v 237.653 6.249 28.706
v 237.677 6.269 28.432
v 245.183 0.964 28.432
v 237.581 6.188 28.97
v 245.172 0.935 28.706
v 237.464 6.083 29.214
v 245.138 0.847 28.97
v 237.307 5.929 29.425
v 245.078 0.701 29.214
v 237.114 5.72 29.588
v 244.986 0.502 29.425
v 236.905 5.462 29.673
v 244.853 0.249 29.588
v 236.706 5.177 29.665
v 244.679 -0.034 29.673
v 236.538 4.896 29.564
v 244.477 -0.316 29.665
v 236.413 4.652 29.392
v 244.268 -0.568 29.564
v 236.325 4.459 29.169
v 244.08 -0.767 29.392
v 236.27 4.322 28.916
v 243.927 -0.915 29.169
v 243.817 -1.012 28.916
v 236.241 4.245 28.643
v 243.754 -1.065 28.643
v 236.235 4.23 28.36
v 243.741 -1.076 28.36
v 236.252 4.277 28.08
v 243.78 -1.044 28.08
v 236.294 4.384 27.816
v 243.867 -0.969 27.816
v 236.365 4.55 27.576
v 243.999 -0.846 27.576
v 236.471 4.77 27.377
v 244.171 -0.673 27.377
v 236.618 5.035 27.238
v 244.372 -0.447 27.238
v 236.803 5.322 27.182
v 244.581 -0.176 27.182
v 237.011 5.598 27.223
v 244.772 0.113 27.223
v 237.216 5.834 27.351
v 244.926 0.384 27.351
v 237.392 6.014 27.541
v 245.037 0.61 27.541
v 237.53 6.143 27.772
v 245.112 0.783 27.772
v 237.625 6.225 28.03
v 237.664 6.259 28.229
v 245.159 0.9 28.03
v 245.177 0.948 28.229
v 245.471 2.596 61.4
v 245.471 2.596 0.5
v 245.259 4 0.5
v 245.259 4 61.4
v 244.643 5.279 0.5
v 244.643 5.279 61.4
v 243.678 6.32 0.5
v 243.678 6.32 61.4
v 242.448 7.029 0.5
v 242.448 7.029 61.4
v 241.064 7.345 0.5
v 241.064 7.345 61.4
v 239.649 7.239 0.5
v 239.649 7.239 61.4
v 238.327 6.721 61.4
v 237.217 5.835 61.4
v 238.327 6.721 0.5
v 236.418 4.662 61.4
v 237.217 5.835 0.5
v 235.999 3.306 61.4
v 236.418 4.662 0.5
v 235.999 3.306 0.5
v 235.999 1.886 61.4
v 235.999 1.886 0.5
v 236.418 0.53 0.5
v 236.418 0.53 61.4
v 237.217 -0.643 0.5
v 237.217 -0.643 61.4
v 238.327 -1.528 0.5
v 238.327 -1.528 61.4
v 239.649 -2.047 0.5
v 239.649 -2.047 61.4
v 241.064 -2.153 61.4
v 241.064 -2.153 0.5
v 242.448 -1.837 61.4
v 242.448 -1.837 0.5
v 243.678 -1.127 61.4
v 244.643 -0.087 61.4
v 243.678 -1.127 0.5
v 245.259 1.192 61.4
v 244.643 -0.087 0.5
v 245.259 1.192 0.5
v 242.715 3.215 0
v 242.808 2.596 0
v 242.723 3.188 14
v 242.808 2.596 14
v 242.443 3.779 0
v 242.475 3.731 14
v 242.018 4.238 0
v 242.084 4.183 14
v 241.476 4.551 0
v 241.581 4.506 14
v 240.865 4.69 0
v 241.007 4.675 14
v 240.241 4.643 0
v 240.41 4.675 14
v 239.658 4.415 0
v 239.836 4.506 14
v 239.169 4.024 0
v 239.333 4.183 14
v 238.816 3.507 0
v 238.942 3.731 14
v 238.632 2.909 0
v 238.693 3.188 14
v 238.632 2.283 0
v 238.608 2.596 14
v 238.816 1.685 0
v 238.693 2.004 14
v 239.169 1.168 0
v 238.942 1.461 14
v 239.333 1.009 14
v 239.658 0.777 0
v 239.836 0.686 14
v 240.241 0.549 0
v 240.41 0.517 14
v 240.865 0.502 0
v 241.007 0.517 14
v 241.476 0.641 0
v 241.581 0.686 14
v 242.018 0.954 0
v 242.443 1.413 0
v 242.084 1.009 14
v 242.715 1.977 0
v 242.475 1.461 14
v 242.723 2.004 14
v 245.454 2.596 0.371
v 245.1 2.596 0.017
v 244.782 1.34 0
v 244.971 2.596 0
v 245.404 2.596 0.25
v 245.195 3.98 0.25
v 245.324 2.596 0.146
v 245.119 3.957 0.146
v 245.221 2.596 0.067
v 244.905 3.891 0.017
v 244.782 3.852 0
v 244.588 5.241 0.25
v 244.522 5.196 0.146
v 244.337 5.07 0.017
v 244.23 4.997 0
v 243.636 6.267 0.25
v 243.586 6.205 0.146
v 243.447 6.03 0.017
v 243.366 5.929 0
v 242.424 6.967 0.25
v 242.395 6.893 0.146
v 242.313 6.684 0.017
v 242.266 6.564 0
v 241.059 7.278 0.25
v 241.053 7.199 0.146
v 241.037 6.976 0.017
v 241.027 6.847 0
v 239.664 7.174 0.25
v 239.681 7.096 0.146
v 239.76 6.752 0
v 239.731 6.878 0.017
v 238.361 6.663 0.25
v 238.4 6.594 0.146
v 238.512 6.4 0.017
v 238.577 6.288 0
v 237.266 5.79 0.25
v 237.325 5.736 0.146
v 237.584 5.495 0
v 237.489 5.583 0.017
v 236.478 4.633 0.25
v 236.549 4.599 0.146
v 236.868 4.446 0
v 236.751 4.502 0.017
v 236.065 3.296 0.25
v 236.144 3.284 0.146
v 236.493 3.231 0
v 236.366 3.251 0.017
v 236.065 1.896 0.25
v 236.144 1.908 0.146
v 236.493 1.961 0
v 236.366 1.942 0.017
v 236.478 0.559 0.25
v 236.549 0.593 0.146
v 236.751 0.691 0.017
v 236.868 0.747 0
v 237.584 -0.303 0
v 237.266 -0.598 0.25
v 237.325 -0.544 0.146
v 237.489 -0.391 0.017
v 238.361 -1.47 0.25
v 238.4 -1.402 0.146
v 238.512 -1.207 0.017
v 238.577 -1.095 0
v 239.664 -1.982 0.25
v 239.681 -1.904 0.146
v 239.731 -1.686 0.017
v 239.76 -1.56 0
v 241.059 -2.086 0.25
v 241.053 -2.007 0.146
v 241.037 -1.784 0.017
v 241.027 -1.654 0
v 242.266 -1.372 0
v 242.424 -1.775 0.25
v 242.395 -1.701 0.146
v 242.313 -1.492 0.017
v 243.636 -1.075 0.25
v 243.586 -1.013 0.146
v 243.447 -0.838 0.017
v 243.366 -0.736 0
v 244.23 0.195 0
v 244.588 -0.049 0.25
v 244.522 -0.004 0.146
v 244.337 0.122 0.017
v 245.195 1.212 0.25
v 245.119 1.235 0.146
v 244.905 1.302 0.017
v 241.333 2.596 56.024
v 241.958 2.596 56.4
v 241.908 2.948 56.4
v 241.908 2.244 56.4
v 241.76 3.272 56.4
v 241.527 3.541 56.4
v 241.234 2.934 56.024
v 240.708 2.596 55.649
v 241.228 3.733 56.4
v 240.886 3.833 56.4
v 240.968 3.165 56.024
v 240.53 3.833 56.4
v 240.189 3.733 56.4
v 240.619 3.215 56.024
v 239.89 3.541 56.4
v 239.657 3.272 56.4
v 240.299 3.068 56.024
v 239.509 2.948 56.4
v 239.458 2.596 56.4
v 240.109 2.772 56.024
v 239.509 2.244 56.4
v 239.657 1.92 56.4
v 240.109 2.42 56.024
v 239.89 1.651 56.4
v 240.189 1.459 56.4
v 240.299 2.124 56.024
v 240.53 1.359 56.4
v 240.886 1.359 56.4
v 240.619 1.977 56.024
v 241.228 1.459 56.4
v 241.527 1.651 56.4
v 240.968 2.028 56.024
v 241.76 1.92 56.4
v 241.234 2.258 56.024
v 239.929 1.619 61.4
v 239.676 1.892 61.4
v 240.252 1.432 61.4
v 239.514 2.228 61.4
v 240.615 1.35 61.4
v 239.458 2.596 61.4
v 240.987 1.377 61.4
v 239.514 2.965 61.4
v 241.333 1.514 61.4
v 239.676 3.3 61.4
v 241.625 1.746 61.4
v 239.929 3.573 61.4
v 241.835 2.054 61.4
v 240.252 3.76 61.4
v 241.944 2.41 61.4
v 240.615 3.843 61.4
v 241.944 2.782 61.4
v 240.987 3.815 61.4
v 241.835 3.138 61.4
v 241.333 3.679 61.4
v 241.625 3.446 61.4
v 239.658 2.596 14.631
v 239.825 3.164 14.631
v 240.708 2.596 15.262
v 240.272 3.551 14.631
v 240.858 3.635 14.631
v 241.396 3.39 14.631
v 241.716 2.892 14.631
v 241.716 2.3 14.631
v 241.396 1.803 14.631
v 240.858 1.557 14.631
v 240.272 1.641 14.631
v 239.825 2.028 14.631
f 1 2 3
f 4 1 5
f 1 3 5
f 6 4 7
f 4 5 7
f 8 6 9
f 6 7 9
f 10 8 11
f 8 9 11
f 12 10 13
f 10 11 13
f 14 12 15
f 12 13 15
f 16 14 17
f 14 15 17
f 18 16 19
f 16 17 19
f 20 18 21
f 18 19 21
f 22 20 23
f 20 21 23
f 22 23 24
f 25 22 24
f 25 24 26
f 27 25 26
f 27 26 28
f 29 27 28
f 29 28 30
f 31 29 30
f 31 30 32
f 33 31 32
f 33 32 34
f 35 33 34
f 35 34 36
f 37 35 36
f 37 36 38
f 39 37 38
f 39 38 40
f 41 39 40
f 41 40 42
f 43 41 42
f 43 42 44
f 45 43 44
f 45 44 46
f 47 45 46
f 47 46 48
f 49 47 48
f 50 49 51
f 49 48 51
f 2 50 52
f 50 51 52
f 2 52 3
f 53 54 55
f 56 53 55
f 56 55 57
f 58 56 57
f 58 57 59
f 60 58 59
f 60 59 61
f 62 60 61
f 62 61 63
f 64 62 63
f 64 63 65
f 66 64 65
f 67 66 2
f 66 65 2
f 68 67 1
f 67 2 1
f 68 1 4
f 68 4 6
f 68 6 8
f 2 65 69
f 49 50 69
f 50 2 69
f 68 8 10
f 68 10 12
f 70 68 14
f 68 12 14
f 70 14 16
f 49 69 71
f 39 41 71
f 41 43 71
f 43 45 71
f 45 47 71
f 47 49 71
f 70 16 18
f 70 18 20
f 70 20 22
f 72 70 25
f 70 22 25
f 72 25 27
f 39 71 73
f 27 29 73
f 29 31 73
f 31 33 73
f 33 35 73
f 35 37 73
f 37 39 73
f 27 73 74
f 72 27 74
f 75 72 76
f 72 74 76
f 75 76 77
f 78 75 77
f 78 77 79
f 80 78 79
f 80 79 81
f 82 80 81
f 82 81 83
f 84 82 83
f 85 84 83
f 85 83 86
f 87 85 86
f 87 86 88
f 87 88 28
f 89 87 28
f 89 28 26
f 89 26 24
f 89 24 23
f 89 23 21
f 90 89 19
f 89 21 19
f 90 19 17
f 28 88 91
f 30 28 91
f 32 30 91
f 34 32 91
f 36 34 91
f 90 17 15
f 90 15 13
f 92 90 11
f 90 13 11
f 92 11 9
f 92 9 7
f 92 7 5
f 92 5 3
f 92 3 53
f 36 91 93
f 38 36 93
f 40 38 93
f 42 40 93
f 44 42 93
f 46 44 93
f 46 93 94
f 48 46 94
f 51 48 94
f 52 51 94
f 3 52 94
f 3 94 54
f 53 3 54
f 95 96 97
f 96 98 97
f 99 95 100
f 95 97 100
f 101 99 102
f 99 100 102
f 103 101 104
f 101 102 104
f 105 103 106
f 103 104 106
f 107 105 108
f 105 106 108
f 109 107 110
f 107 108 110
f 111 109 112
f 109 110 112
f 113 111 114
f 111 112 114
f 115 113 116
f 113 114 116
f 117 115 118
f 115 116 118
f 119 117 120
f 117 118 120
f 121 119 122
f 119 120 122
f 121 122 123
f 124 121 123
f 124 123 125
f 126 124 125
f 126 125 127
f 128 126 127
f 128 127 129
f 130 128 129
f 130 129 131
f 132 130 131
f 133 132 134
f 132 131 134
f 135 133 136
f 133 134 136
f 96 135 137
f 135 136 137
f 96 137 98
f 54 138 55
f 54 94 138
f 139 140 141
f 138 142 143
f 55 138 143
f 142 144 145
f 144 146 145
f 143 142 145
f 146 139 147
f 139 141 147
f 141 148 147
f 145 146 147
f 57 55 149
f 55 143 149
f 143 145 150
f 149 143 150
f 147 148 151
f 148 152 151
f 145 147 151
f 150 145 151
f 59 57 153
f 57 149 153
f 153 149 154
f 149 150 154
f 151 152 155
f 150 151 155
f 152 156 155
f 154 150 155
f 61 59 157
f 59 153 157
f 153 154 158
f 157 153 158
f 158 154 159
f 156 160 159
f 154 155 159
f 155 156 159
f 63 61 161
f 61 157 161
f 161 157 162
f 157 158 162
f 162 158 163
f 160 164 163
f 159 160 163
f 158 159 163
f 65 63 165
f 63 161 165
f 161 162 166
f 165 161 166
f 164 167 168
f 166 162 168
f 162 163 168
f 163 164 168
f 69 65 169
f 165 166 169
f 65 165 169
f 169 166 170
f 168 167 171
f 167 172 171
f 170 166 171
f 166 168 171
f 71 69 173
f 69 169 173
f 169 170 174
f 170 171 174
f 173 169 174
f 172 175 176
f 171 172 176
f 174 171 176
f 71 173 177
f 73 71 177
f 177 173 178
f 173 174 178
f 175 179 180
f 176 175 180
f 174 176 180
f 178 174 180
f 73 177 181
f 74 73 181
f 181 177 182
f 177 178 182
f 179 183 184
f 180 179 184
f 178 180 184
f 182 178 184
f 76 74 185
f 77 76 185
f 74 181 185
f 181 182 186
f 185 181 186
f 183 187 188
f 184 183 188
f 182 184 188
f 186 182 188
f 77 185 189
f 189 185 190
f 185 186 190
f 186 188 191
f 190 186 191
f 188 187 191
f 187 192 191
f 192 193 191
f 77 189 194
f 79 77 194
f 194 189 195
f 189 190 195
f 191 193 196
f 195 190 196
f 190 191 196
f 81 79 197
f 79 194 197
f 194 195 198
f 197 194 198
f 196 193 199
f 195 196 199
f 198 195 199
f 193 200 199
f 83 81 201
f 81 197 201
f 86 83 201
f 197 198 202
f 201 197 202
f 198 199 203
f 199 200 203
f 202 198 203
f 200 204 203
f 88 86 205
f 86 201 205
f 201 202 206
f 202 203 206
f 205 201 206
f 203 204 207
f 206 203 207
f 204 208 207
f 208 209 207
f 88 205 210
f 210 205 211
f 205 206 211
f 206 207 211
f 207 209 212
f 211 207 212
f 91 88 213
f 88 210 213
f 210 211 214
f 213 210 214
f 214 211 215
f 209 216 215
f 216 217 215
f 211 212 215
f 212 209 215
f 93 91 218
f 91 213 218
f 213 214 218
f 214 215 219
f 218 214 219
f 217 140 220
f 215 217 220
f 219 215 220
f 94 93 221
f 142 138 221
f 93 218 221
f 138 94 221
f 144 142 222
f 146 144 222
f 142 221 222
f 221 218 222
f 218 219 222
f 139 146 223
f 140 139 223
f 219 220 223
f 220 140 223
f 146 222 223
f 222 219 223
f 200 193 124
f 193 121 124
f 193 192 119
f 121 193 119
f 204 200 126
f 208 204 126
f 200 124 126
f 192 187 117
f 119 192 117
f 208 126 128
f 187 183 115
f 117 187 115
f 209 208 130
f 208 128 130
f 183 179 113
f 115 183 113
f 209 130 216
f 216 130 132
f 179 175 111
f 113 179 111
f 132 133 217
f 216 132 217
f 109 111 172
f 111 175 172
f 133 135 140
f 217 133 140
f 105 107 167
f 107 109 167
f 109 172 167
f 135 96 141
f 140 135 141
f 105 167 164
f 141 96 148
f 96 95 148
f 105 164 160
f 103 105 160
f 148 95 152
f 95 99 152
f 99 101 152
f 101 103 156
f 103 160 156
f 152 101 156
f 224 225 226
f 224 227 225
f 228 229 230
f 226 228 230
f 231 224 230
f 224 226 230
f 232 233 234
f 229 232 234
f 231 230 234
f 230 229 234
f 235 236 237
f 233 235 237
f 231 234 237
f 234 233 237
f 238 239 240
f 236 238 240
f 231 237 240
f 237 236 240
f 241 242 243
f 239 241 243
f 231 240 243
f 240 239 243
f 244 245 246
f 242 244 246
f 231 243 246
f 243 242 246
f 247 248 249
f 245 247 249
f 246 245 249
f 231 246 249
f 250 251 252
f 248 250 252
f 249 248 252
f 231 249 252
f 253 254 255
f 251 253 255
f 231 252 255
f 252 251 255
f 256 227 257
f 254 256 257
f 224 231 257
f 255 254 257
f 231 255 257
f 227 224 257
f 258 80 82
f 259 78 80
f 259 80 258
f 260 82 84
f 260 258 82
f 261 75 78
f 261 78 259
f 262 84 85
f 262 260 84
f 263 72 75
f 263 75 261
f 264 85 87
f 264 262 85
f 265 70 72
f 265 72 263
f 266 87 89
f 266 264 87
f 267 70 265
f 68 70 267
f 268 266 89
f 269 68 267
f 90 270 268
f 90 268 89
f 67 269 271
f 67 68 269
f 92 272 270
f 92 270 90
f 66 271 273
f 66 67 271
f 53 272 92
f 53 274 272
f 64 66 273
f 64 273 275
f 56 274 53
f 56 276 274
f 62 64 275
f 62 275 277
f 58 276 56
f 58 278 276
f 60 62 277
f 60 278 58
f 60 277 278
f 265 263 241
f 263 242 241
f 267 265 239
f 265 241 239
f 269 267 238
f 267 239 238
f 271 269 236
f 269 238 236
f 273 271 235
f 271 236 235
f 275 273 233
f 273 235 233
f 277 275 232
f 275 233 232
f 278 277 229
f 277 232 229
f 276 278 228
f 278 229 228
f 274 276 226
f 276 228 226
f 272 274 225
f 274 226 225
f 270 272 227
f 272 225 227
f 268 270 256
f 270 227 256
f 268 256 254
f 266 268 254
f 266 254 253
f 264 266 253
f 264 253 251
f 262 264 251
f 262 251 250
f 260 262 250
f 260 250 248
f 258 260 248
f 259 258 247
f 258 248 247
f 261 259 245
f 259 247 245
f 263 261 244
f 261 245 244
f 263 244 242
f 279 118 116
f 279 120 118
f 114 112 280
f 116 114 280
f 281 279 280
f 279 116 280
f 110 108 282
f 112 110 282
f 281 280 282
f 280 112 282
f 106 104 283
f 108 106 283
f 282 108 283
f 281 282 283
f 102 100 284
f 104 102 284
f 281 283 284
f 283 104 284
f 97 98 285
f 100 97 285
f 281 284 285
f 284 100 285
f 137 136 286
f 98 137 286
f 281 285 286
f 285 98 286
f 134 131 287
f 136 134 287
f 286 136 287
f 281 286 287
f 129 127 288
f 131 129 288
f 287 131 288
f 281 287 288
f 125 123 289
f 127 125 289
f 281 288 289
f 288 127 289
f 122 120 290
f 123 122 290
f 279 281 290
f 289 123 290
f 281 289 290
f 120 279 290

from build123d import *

# Parameters (mm, degrees)
ESBO_O1_R                                      = 4.7625
RESSALTO_EXTRUS_O1_DEPTH                       = 61.4
FURO_ROSCADO_DE_M5X0_81_D                      = 4.2
FURO_ROSCADO_DE_M5X0_81_DEPTH                  = 14
FURO_ROSCADO_DE_M5X0_81_TIP                    = 1.2618073
FILETE1_R                                      = 0.5
BROCA_DE_ROSQUEAR_PARA_TARRAXA_DE_M3X0_5_D     = 2.5
BROCA_DE_ROSQUEAR_PARA_TARRAXA_DE_M3X0_5_DEPTH = 5
BROCA_DE_ROSQUEAR_PARA_TARRAXA_DE_M3X0_5_TIP   = 0.751075774
BROCA_DE_ROSQUEAR_PARA_TARRAXA_DE_M3_2_D       = 2.5
BROCA_DE_ROSQUEAR_PARA_TARRAXA_DE_M3_2_DEPTH   = 10
BROCA_DE_ROSQUEAR_PARA_TARRAXA_DE_M3_2_TIP     = 0.751075774


with BuildPart() as part:
    # Esboço1 → Ressalto-extrusão1 (new body)
    with BuildSketch(Plane.XY):
        with Locations((240.708388302, 2.596082859)):
            Circle(ESBO_O1_R)
    extrude(amount=RESSALTO_EXTRUS_O1_DEPTH)

    # Furo roscado de M5x0.81
    with Locations(Plane(origin=(0, 0, 0), x_dir=(-1, 0, 0), z_dir=(0, 0, -1))):
        with Locations((-240.708388302, 2.596082859)):
            Hole(FURO_ROSCADO_DE_M5X0_81_D / 2, depth=FURO_ROSCADO_DE_M5X0_81_DEPTH)
            with Locations((0, 0, -(FURO_ROSCADO_DE_M5X0_81_DEPTH + FURO_ROSCADO_DE_M5X0_81_TIP / 2))):  # 118° drill point
                Cone(0, FURO_ROSCADO_DE_M5X0_81_D / 2, FURO_ROSCADO_DE_M5X0_81_TIP, mode=Mode.SUBTRACT)

    # Filete1
    filete1_edges = [part.edges().sort_by_distance(p)[0] for p in [
        (235.945888302, 2.596082859, 0),
    ]]
    fillet(filete1_edges, radius=FILETE1_R)

    # Broca de rosquear para tarraxa de M3x0.5
    with Locations(Plane.XY.offset(61.4)):
        with Locations((240.708388302, 2.596082859)):
            Hole(BROCA_DE_ROSQUEAR_PARA_TARRAXA_DE_M3X0_5_D / 2, depth=BROCA_DE_ROSQUEAR_PARA_TARRAXA_DE_M3X0_5_DEPTH)
            with Locations((0, 0, -(BROCA_DE_ROSQUEAR_PARA_TARRAXA_DE_M3X0_5_DEPTH + BROCA_DE_ROSQUEAR_PARA_TARRAXA_DE_M3X0_5_TIP / 2))):  # 118° drill point
                Cone(0, BROCA_DE_ROSQUEAR_PARA_TARRAXA_DE_M3X0_5_D / 2, BROCA_DE_ROSQUEAR_PARA_TARRAXA_DE_M3X0_5_TIP, mode=Mode.SUBTRACT)

    # Broca de rosquear para tarraxa de M3 2
    with Locations(Plane(origin=(236.819403783, 5.345120084, 28.431873204), x_dir=(-0.577225664074, -0.81658467579, 0), z_dir=(-0.81658467579, 0.577225664074, 0))):
        with Locations((0, 0)):
            Hole(BROCA_DE_ROSQUEAR_PARA_TARRAXA_DE_M3_2_D / 2, depth=BROCA_DE_ROSQUEAR_PARA_TARRAXA_DE_M3_2_DEPTH)
            with Locations((0, 0, -(BROCA_DE_ROSQUEAR_PARA_TARRAXA_DE_M3_2_DEPTH + BROCA_DE_ROSQUEAR_PARA_TARRAXA_DE_M3_2_TIP / 2))):  # 118° drill point
                Cone(0, BROCA_DE_ROSQUEAR_PARA_TARRAXA_DE_M3_2_D / 2, BROCA_DE_ROSQUEAR_PARA_TARRAXA_DE_M3_2_TIP, mode=Mode.SUBTRACT)


solid = part.part
